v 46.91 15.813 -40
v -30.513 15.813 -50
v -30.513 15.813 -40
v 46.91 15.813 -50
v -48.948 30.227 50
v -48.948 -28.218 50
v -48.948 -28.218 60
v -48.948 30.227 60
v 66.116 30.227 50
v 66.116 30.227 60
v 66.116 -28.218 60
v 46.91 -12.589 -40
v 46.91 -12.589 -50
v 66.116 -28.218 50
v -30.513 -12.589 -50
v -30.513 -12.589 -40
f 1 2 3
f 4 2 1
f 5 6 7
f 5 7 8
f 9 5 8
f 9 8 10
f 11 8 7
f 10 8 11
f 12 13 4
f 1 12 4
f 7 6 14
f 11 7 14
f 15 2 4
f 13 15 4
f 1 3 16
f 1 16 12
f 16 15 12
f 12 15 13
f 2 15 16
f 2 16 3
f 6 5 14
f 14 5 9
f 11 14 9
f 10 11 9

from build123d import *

# Parameters (mm, degrees)
ESQUISSE2_W        = 115.063292794
ESQUISSE2_H        = 58.444847134
BOSS_EXTRU_1_DEPTH = 10
ESQUISSE3_W        = 77.422409309
ESQUISSE3_H        = 28.401365068
BOSS_EXTRU_2_DEPTH = 10


with BuildPart() as part:
    # Esquisse2 → Boss.-Extru.1 (new body)
    with BuildSketch(Plane.XY.offset(50)):
        with Locations((8.584086923, 1.00452081)):
            Rectangle(ESQUISSE2_W, ESQUISSE2_H)
    extrude(amount=BOSS_EXTRU_1_DEPTH)


with BuildPart() as body_2:
    # Esquisse3 → Boss.-Extru.2 (new body)
    with BuildSketch(Plane.XY.offset(-50)):
        with Locations((8.198484022, 1.612162963)):
            Rectangle(ESQUISSE3_W, ESQUISSE3_H)
    extrude(amount=BOSS_EXTRU_2_DEPTH)


solid = Compound([part.part, body_2.part])
